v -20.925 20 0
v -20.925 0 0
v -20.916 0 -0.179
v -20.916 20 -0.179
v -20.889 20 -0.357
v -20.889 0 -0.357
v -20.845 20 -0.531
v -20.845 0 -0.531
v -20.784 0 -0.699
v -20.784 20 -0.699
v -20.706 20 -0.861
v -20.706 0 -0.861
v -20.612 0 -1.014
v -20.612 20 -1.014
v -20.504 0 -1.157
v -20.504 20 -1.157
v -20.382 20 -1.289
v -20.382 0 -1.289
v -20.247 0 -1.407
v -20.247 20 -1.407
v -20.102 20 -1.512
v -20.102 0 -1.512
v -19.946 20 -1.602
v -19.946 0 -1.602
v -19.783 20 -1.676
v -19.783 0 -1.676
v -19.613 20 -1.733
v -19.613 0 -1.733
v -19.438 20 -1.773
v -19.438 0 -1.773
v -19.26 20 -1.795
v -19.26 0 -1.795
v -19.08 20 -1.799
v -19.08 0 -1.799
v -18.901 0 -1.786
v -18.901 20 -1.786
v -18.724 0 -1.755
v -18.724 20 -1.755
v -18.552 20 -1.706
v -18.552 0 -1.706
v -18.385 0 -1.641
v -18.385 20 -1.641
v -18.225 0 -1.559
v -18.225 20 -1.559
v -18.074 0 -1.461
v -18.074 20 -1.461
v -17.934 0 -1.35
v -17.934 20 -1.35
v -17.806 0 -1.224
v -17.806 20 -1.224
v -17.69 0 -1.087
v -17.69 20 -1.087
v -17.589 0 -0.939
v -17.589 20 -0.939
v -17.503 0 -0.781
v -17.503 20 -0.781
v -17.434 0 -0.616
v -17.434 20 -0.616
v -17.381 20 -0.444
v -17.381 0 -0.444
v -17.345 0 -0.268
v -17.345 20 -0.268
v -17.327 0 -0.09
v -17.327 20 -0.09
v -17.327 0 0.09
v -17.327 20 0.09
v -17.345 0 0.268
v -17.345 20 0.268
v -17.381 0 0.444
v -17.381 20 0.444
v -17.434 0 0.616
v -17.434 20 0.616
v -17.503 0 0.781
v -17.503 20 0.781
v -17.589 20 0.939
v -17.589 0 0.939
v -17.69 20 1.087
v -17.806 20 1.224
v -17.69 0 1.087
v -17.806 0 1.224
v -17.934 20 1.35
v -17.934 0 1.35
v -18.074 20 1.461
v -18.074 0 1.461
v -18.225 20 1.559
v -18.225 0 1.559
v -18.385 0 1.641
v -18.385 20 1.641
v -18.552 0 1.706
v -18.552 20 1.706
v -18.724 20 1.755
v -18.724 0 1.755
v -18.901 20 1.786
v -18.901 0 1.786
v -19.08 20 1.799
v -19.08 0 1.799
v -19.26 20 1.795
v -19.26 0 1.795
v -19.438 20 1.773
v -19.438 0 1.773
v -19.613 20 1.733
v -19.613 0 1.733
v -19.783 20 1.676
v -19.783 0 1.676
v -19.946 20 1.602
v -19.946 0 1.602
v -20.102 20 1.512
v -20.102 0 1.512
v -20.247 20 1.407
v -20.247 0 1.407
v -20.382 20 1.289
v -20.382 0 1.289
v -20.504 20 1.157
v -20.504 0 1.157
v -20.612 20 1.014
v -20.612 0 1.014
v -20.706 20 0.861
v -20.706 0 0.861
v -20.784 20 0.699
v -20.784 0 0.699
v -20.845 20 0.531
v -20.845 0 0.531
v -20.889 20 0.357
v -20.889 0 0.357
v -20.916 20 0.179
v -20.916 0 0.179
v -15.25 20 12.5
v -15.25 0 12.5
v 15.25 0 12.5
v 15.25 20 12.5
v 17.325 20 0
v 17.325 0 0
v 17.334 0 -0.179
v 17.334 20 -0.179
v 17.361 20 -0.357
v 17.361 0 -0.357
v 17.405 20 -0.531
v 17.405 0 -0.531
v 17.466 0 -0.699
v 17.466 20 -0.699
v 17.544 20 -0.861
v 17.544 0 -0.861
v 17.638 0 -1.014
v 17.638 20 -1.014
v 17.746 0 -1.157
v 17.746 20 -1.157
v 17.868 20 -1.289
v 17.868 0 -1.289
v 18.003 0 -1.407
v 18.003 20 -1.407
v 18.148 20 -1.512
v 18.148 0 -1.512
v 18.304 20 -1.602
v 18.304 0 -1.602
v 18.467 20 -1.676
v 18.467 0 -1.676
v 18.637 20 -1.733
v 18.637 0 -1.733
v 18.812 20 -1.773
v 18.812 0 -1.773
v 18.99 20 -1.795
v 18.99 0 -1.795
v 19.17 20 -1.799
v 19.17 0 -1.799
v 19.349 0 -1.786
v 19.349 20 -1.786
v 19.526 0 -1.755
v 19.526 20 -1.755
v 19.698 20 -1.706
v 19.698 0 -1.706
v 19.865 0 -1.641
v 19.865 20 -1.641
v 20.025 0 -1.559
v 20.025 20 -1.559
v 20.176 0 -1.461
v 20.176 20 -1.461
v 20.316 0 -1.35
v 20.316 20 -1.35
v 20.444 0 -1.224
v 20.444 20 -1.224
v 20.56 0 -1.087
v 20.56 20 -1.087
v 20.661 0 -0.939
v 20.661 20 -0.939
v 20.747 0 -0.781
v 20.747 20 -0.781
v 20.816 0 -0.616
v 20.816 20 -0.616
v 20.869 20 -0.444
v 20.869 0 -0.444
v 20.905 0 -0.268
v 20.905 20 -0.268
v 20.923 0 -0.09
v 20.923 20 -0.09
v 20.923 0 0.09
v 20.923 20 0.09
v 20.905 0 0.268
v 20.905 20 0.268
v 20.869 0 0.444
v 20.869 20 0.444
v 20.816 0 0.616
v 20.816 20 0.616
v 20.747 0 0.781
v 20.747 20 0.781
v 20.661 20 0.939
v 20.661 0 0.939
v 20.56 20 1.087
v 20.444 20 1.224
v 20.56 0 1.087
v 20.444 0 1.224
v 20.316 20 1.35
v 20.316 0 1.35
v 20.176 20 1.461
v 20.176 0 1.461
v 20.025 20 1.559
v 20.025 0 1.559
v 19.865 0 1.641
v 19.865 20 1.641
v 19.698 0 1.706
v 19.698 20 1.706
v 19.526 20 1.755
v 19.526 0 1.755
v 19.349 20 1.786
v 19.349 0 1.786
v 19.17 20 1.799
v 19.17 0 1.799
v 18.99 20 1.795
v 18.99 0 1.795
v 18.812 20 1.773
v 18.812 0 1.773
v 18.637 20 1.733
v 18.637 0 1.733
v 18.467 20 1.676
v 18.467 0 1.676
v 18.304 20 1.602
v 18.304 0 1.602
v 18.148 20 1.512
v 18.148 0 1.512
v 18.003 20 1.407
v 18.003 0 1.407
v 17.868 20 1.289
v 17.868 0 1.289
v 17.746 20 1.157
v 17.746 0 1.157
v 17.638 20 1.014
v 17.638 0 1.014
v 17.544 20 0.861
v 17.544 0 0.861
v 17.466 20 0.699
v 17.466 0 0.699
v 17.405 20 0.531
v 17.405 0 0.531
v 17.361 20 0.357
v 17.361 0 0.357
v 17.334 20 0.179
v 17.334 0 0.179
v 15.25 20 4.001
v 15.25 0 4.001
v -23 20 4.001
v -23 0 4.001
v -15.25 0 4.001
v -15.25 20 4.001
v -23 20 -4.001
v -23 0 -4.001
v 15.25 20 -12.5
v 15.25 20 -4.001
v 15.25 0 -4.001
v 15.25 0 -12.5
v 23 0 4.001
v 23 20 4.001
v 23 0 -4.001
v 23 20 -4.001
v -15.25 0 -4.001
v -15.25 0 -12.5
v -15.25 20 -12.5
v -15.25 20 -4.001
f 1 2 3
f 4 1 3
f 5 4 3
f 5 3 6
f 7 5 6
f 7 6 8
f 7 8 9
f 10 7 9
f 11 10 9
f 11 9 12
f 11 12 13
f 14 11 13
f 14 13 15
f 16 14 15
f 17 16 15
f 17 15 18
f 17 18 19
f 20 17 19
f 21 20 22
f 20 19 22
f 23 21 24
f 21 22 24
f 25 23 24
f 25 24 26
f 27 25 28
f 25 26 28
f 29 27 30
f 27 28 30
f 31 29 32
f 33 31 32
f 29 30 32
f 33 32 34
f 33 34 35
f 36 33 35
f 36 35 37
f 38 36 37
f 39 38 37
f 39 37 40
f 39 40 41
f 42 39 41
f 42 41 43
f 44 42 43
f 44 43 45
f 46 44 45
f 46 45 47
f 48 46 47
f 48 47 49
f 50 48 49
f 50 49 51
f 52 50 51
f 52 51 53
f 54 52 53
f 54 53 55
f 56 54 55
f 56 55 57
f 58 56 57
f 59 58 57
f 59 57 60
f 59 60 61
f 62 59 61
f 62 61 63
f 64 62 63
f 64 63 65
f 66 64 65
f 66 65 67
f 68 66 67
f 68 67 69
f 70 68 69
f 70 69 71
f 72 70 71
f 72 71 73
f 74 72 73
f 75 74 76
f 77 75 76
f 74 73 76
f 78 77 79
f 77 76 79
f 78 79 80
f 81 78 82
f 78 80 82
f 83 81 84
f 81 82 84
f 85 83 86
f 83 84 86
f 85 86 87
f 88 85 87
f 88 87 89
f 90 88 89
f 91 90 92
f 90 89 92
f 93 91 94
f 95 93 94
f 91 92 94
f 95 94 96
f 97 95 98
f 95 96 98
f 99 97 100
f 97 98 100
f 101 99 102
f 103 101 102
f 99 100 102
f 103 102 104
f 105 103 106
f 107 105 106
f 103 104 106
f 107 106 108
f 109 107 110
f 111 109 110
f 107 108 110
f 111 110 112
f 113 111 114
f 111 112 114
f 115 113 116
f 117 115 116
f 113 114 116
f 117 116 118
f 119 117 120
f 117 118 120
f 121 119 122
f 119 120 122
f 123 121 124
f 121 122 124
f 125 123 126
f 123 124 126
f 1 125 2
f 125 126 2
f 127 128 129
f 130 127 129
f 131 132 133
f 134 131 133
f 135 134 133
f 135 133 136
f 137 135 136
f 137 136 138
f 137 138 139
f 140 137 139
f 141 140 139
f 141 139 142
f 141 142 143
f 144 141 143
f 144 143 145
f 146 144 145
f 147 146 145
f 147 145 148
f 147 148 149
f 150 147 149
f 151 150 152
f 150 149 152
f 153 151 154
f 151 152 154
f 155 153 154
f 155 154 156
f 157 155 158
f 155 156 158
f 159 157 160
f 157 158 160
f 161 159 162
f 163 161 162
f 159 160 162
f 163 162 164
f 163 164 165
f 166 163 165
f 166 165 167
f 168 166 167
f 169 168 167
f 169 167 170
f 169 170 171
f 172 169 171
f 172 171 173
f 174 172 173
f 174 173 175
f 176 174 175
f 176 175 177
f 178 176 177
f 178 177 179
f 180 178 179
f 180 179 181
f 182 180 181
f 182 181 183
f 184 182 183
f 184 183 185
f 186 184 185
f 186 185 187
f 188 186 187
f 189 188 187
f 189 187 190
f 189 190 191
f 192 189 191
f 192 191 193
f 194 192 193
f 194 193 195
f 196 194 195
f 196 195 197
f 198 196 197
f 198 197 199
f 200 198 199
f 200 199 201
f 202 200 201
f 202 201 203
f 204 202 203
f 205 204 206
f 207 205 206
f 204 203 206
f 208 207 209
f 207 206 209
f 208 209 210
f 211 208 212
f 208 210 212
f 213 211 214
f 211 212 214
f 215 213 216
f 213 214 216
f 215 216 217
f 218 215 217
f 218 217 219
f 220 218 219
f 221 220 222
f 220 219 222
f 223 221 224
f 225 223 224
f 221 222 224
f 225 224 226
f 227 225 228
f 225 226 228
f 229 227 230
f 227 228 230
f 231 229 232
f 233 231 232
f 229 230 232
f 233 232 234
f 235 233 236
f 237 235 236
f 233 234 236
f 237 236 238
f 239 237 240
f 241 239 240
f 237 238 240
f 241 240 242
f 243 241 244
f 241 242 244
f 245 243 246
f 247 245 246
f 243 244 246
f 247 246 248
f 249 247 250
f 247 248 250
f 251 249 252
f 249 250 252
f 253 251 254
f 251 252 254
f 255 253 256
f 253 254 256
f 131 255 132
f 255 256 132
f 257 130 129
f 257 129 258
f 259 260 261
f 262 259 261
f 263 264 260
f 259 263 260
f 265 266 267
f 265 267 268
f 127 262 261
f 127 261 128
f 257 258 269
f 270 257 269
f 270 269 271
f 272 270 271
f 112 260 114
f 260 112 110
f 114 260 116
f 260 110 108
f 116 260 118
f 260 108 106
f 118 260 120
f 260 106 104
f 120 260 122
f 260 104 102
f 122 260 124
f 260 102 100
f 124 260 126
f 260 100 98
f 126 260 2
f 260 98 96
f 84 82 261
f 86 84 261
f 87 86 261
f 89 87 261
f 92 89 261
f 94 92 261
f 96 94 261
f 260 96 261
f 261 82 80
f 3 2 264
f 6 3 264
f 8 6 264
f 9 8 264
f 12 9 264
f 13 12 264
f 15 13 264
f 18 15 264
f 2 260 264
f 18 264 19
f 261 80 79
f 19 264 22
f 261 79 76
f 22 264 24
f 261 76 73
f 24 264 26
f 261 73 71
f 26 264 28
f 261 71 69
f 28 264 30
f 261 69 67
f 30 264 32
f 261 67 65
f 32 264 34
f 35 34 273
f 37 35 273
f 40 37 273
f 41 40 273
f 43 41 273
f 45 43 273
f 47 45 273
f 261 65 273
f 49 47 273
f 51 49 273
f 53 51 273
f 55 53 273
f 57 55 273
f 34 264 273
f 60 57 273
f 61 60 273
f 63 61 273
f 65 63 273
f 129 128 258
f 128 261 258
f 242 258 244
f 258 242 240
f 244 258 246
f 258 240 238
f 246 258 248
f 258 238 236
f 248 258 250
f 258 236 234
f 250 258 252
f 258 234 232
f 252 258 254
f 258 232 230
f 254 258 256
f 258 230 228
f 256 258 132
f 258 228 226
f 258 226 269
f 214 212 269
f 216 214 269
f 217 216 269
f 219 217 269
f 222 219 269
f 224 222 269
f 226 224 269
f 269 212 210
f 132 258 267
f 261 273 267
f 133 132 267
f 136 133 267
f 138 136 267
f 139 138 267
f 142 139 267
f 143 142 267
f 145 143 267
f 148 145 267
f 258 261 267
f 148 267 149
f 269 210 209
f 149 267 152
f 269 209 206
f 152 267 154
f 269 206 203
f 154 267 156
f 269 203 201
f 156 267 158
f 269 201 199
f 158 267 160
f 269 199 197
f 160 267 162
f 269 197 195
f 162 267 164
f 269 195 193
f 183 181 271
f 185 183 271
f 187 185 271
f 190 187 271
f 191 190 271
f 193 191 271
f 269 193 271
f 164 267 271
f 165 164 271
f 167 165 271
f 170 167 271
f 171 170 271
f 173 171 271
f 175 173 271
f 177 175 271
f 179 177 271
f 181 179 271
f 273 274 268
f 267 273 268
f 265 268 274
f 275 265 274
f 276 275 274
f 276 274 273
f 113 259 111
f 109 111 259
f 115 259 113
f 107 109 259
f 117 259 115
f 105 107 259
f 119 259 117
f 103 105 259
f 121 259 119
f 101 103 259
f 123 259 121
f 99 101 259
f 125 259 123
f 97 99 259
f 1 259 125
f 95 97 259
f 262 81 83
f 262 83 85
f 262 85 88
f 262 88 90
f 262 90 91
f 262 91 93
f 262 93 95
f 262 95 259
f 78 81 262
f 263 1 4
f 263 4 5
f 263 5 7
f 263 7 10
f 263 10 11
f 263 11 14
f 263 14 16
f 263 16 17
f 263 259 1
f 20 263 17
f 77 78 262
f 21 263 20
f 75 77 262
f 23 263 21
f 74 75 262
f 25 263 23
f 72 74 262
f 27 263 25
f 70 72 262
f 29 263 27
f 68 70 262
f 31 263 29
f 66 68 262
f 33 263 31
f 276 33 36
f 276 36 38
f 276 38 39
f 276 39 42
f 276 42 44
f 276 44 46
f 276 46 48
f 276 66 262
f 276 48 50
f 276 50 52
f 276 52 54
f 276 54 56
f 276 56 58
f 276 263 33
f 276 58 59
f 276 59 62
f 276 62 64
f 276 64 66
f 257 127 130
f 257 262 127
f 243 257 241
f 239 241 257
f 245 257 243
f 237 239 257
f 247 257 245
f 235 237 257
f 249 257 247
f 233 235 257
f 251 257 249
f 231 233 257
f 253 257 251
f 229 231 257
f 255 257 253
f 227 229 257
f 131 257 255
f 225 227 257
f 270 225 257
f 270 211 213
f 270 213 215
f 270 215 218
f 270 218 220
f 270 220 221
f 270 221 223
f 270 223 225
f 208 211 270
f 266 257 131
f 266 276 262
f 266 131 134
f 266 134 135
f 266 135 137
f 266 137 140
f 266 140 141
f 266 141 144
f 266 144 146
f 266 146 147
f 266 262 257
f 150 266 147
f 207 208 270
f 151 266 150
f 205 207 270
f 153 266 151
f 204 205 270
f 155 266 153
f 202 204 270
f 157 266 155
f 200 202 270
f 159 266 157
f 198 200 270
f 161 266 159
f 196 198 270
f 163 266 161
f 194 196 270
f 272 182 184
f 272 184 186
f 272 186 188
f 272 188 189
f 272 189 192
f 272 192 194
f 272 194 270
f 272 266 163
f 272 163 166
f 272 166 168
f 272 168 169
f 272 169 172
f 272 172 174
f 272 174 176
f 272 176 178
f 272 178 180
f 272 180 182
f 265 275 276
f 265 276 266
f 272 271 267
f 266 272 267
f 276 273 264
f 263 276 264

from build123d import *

# Parameters (mm, degrees)
BOSS_EXTRU_1_DEPTH = 20
D_GAGEMENT_M31_D   = 3.6


with BuildPart() as part:
    # Esquisse1 → Boss.-Extru.1 (new body)
    with BuildSketch(Plane(origin=(0, 0, 0), x_dir=(1, 0, 0), z_dir=(0, 1, 0))):
        Polygon((-15.25, -12.5), (15.25, -12.5), (15.25, -4.001343409), (23, -4.001343409), (23, 4.001343409), (15.25, 4.001343409), (15.25, 12.5), (-15.25, 12.5), (-15.25, 4.001343409), (-23, 4.001343409), (-23, -4.001343409), (-15.25, -4.001343409), align=None)
    extrude(amount=BOSS_EXTRU_1_DEPTH)

    # Dégagement M31 (through all)
    with Locations(Plane(origin=(0, 20, 0), x_dir=(1, 0, 0), z_dir=(0, 1, 0))):
        with Locations((-19.125, 0), (19.125, 0)):
            Hole(D_GAGEMENT_M31_D / 2)


solid = part.part
